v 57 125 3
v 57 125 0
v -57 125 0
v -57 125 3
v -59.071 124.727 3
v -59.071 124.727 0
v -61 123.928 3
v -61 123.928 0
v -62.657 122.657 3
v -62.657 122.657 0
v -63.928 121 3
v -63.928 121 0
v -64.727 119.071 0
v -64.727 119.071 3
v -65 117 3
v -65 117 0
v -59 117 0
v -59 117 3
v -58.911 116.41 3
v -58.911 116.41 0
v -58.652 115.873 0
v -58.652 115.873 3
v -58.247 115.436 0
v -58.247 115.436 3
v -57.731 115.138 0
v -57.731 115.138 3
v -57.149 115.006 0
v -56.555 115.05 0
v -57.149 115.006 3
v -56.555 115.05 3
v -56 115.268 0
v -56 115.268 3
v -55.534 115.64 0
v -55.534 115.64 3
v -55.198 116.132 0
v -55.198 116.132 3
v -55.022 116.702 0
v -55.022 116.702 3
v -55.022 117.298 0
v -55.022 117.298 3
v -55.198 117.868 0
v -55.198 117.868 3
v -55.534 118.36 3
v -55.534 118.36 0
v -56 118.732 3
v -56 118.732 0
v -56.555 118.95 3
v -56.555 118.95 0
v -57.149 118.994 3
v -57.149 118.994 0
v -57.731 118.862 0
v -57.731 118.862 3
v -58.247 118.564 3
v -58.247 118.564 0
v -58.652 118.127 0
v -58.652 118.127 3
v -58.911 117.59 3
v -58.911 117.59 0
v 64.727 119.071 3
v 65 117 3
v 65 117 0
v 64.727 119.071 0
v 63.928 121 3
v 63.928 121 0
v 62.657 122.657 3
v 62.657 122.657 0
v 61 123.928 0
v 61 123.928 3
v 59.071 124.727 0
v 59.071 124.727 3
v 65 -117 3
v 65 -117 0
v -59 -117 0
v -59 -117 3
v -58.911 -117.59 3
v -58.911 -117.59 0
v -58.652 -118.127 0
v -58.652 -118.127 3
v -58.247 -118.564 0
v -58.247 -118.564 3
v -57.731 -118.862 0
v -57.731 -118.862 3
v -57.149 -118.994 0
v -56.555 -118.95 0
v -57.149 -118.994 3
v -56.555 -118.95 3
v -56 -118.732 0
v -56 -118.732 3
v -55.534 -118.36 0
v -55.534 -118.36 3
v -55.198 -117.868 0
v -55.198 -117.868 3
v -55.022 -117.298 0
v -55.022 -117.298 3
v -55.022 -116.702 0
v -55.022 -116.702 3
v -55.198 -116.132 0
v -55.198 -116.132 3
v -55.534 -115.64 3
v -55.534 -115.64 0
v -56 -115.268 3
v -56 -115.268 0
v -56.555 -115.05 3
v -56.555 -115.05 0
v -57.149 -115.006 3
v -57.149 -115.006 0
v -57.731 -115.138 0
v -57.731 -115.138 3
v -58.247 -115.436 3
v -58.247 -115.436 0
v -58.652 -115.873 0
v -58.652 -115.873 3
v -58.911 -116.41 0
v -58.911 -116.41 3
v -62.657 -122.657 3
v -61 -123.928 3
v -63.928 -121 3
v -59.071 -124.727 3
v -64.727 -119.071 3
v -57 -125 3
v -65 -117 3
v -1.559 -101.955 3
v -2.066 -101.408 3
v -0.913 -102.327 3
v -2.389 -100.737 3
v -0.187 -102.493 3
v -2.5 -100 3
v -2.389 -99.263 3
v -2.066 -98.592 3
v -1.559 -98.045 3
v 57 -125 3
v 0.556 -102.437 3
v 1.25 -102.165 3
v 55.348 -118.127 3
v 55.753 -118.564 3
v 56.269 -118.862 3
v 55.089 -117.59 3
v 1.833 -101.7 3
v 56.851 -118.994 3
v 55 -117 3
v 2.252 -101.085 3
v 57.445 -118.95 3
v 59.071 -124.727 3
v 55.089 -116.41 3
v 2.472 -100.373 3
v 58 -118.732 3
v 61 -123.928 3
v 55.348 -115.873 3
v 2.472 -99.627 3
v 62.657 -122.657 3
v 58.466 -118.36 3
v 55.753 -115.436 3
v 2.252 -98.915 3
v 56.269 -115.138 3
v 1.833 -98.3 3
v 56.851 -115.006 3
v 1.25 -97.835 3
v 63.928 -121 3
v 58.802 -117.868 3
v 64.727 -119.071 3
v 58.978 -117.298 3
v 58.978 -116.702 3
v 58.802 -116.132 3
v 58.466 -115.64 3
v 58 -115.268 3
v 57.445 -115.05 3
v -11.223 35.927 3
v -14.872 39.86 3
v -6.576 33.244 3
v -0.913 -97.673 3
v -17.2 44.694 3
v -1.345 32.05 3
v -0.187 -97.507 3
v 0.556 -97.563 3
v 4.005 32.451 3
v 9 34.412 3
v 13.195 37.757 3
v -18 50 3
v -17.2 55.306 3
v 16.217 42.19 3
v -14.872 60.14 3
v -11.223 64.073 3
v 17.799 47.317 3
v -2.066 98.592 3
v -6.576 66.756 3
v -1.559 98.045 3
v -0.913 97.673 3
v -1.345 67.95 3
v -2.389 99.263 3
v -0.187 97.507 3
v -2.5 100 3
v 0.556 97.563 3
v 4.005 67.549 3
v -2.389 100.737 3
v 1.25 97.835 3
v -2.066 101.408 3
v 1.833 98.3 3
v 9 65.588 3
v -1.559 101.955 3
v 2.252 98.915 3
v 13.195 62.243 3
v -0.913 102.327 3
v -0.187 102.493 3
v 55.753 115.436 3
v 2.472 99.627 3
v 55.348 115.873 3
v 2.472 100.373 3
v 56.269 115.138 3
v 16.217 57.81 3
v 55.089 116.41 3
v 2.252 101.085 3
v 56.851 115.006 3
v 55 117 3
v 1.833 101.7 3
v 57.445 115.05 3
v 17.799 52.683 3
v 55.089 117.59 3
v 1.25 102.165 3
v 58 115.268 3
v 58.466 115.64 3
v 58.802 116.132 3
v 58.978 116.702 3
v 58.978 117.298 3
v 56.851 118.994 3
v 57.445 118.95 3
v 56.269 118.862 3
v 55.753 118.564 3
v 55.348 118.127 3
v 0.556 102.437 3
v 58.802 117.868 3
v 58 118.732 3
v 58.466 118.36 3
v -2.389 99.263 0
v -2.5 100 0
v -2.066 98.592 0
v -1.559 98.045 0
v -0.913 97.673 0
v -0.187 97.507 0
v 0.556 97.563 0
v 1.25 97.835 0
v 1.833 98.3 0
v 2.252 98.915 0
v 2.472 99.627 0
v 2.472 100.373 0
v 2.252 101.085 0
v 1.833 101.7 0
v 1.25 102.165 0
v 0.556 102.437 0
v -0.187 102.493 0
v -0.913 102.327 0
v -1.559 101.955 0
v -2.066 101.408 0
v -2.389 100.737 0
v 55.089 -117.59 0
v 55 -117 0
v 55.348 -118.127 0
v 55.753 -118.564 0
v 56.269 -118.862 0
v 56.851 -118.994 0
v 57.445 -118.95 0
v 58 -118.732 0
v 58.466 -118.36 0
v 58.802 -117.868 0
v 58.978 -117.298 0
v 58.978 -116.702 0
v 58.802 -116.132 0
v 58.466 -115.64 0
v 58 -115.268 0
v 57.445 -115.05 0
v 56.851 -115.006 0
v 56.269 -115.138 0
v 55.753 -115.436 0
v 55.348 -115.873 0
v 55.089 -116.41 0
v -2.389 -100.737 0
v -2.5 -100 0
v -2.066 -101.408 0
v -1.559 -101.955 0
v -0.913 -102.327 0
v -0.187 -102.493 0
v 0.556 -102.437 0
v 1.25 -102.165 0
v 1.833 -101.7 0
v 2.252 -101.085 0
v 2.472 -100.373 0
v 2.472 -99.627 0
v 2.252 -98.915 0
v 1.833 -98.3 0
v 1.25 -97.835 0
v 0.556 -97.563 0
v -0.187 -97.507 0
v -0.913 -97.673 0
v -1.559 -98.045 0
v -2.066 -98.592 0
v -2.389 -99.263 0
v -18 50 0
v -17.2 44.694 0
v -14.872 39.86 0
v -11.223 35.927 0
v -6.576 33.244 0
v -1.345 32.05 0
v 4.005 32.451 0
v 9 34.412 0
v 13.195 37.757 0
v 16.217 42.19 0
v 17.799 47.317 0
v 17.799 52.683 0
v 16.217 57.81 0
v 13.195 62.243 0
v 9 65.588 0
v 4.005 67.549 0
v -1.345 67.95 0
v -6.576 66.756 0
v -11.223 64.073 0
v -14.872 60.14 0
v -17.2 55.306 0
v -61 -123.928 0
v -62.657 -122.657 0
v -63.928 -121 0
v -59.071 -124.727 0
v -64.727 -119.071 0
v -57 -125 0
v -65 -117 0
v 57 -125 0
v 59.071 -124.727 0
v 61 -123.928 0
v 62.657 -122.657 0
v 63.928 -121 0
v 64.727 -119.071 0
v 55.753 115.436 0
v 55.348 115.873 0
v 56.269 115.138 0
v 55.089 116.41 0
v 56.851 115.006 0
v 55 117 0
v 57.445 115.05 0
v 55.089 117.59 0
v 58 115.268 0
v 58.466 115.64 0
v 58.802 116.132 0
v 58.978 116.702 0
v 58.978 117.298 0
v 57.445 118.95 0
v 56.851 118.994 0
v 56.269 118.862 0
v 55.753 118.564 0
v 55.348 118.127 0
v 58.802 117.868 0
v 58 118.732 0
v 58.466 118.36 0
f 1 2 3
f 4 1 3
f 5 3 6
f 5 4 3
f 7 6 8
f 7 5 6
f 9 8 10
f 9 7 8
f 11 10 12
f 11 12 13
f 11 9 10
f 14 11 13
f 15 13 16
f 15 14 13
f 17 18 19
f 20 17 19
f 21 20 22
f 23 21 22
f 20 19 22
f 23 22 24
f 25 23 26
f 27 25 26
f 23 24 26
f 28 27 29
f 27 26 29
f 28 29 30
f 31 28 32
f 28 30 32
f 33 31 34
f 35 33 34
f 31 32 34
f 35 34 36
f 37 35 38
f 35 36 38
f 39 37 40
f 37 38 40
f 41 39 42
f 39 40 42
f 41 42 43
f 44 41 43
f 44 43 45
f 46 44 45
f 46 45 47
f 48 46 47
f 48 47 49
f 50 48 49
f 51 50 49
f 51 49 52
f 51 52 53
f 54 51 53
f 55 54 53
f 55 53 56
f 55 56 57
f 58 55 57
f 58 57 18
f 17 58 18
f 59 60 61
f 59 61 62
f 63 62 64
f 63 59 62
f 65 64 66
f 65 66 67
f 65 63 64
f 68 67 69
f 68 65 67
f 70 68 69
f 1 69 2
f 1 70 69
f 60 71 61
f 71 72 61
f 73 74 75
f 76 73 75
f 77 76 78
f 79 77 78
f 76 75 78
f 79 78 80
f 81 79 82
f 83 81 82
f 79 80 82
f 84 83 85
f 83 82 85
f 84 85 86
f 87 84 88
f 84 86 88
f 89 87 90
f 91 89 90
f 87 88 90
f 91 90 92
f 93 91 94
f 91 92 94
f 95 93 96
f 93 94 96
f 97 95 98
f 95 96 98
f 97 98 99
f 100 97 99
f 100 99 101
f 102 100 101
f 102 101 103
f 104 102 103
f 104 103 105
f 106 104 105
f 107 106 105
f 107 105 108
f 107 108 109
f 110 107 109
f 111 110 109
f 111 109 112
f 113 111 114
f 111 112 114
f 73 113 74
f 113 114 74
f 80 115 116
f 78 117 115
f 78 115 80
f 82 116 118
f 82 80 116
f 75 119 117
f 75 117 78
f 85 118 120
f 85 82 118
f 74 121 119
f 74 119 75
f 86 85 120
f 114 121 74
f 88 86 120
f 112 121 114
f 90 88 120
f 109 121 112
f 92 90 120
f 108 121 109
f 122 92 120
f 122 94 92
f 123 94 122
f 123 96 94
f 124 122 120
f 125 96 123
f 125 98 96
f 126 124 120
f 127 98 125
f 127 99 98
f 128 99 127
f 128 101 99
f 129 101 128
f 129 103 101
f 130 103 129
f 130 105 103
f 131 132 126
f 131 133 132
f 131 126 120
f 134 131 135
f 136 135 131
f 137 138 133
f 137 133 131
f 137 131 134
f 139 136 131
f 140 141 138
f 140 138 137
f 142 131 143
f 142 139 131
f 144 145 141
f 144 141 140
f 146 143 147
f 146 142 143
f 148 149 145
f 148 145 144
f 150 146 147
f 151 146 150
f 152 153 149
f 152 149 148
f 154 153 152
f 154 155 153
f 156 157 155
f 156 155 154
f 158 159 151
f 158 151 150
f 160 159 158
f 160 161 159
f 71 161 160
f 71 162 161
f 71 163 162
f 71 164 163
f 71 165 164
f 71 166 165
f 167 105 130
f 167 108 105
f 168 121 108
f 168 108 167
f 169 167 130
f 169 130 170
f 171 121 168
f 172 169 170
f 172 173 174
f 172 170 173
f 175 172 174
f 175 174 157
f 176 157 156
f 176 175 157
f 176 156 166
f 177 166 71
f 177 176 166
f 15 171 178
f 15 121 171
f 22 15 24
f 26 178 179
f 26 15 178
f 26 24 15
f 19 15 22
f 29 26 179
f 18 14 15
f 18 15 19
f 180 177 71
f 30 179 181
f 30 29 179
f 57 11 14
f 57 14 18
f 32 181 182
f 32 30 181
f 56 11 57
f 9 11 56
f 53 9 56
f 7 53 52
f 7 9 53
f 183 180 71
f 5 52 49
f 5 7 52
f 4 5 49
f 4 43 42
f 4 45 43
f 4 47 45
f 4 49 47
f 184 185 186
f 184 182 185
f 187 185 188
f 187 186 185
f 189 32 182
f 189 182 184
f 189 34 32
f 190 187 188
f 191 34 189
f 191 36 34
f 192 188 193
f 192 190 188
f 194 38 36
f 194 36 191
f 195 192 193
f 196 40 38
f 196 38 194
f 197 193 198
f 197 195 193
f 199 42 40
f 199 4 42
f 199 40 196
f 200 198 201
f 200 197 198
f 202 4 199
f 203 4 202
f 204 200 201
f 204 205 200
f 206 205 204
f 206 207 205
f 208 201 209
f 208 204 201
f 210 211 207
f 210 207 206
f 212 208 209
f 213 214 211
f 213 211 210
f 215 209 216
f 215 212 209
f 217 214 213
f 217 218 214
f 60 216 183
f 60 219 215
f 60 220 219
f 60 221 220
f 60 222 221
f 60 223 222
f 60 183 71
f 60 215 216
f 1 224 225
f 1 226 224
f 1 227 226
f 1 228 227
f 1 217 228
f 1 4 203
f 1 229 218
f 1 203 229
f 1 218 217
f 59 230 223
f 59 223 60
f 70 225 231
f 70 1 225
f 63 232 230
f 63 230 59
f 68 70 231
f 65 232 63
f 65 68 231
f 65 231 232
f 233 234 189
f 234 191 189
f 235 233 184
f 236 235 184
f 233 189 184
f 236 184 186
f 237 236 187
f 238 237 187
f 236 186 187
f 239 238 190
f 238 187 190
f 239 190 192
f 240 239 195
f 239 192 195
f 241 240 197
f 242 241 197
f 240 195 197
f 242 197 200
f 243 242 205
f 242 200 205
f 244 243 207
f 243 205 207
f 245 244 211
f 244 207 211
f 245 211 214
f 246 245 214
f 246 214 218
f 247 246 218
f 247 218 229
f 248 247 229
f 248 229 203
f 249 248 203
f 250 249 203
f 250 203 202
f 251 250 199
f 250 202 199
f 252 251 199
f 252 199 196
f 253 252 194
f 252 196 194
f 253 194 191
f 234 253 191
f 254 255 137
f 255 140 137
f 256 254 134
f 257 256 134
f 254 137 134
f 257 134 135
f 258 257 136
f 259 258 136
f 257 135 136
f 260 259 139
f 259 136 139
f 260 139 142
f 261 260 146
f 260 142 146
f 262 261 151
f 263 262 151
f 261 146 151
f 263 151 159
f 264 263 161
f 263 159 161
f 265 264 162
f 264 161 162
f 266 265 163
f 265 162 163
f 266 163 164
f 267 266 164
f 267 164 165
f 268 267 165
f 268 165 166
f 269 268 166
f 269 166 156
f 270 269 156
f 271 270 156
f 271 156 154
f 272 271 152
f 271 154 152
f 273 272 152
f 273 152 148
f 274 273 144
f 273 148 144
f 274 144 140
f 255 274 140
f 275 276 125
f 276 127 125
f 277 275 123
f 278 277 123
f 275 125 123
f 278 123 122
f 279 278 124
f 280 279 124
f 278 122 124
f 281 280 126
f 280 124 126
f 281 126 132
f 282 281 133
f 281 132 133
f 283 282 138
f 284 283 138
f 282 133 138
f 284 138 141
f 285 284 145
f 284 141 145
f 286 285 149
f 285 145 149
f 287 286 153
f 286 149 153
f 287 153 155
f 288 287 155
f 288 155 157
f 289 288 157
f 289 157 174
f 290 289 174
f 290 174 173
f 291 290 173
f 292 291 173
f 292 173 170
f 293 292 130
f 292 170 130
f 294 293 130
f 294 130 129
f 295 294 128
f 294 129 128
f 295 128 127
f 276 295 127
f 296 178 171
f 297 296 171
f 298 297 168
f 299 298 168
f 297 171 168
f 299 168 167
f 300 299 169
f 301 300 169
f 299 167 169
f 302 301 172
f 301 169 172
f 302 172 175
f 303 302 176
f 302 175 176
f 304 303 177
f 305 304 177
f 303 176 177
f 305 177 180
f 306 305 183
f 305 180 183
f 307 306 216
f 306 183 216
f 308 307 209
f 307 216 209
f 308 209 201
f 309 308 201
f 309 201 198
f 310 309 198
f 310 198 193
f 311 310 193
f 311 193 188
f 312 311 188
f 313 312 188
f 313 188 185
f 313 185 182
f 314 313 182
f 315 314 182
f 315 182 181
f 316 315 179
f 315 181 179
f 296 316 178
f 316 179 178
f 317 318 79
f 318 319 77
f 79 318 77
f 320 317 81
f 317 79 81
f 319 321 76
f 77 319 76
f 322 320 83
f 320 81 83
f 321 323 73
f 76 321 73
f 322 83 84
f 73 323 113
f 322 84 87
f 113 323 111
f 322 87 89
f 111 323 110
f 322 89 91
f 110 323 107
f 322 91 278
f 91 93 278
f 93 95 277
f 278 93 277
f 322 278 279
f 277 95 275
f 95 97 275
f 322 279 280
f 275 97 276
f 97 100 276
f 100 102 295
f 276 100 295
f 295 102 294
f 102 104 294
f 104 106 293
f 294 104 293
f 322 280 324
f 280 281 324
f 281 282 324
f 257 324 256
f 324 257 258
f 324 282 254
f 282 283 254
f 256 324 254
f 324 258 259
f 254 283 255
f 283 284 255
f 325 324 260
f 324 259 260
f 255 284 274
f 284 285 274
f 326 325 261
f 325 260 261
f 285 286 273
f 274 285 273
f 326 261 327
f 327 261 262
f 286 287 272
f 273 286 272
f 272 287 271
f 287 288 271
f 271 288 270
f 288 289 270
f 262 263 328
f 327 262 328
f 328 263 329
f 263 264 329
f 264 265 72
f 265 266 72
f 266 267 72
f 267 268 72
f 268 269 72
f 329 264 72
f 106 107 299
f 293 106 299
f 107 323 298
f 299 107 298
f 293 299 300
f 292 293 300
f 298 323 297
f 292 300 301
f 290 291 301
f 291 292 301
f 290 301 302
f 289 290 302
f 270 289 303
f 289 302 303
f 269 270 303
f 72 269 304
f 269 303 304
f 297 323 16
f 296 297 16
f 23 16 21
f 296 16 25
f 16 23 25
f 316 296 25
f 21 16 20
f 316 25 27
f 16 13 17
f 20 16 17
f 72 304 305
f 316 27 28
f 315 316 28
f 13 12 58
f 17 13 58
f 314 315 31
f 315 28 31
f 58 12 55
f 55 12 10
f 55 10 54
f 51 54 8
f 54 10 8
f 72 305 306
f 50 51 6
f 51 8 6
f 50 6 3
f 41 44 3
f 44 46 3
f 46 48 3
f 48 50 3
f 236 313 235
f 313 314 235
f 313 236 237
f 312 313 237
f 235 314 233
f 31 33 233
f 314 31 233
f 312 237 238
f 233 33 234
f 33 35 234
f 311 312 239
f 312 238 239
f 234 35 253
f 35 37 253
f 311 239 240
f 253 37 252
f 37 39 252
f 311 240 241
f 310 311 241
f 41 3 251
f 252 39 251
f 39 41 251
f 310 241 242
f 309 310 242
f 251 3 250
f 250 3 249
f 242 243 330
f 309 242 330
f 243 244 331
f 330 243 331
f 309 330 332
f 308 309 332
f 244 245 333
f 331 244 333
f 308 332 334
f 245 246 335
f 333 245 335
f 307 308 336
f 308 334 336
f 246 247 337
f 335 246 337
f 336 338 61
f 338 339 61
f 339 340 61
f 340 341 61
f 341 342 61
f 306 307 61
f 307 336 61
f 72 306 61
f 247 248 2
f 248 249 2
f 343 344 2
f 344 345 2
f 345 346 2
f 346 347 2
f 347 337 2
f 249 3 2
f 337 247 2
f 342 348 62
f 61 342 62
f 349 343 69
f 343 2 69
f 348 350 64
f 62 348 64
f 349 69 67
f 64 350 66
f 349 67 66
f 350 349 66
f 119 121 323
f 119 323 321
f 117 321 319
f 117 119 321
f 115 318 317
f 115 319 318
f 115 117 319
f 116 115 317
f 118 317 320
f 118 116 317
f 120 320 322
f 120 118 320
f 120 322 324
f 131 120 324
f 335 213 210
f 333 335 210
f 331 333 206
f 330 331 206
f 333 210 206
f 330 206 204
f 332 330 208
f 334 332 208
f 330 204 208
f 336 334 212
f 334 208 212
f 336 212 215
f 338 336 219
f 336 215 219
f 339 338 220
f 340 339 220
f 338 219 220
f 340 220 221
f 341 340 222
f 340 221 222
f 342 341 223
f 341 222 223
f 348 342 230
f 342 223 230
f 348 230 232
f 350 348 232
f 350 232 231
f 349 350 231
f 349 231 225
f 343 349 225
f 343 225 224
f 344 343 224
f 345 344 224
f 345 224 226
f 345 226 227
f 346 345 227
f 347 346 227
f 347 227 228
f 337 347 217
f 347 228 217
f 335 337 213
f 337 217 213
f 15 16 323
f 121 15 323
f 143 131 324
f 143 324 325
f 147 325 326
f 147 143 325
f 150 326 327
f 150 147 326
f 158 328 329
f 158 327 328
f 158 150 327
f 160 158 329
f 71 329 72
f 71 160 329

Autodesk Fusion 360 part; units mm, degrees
sketch "Sketch1" plane through (0, 0, 0) normal (0, 0, 1) x (1, 0, 0)
  line L0 (65, 125) -> (-65, 125)
  line L1 (-65, 125) -> (-65, -125)
  line L2 (-65, -125) -> (65, -125)
  line L3 (65, -125) -> (65, 125)
  line L4 (65, 125) -> (-65, -125) construction
  line L5 (-65, 125) -> (65, -125) construction
  dimension "d1" = 130
  dimension "d2" = 250
extrude "Extrude1" add sketch "Sketch1" along normal blind 3
sketch "Sketch2" plane through (0, 0, 3) normal (0, 0, 1) x (-1, 0, 0)
  line L0 (-65, 125) -> (-65, -125)
  line L1 (-65, -125) -> (65, -125)
  line L2 (65, -125) -> (65, 125)
  line L3 (65, 125) -> (-65, 125)
  circle A0 centre (0, -50) radius 18
  circle A1 centre (0, -100) radius 2.5
  circle A2 centre (0, 100) radius 2.5
  dimension "d7" = 5
  dimension "d8" = 5
extrude "Extrude2" cut sketch "Sketch2" against normal blind 3 contours A0 | A1 | A2
fillet "Fillet1" radius 8 4 edges at (65, -125, 1.5) (-65, -125, 1.5) (-65, 125, 1.5) (65, 125, 1.5)
sketch "Sketch3" plane through (0, 0, 3) normal (0, 0, 1) x (-1, 0, 0)
  circle A0 centre (0, 100) radius 2.5
  circle A1 centre (0, -50) radius 18
  circle A2 centre (0, -100) radius 2.5
  arc A3 (-65, -117) -> (-57, -125) centre (-57, -117) ccw
  line L0 (-57, -125) -> (57, -125)
  arc A4 (57, -125) -> (65, -117) centre (57, -117) ccw
  line L1 (65, -117) -> (65, 117)
  arc A5 (65, 117) -> (57, 125) centre (57, 117) ccw
  line L2 (57, 125) -> (-57, 125)
  arc A6 (-57, 125) -> (-65, 117) centre (-57, 117) ccw
  line L3 (-65, 117) -> (-65, -117)
  circle A7 centre (-57, 117) radius 2
  circle A8 centre (57, 117) radius 2
  circle A9 centre (57, -117) radius 2
  circle A10 centre (-57, -117) radius 2
  dimension "d13" = 4
  dimension "d14" = 4
  dimension "d15" = 4
  dimension "d16" = 4
extrude "Extrude3" cut sketch "Sketch3" against normal blind 3 contours A7 | A8 | A9 | A10
